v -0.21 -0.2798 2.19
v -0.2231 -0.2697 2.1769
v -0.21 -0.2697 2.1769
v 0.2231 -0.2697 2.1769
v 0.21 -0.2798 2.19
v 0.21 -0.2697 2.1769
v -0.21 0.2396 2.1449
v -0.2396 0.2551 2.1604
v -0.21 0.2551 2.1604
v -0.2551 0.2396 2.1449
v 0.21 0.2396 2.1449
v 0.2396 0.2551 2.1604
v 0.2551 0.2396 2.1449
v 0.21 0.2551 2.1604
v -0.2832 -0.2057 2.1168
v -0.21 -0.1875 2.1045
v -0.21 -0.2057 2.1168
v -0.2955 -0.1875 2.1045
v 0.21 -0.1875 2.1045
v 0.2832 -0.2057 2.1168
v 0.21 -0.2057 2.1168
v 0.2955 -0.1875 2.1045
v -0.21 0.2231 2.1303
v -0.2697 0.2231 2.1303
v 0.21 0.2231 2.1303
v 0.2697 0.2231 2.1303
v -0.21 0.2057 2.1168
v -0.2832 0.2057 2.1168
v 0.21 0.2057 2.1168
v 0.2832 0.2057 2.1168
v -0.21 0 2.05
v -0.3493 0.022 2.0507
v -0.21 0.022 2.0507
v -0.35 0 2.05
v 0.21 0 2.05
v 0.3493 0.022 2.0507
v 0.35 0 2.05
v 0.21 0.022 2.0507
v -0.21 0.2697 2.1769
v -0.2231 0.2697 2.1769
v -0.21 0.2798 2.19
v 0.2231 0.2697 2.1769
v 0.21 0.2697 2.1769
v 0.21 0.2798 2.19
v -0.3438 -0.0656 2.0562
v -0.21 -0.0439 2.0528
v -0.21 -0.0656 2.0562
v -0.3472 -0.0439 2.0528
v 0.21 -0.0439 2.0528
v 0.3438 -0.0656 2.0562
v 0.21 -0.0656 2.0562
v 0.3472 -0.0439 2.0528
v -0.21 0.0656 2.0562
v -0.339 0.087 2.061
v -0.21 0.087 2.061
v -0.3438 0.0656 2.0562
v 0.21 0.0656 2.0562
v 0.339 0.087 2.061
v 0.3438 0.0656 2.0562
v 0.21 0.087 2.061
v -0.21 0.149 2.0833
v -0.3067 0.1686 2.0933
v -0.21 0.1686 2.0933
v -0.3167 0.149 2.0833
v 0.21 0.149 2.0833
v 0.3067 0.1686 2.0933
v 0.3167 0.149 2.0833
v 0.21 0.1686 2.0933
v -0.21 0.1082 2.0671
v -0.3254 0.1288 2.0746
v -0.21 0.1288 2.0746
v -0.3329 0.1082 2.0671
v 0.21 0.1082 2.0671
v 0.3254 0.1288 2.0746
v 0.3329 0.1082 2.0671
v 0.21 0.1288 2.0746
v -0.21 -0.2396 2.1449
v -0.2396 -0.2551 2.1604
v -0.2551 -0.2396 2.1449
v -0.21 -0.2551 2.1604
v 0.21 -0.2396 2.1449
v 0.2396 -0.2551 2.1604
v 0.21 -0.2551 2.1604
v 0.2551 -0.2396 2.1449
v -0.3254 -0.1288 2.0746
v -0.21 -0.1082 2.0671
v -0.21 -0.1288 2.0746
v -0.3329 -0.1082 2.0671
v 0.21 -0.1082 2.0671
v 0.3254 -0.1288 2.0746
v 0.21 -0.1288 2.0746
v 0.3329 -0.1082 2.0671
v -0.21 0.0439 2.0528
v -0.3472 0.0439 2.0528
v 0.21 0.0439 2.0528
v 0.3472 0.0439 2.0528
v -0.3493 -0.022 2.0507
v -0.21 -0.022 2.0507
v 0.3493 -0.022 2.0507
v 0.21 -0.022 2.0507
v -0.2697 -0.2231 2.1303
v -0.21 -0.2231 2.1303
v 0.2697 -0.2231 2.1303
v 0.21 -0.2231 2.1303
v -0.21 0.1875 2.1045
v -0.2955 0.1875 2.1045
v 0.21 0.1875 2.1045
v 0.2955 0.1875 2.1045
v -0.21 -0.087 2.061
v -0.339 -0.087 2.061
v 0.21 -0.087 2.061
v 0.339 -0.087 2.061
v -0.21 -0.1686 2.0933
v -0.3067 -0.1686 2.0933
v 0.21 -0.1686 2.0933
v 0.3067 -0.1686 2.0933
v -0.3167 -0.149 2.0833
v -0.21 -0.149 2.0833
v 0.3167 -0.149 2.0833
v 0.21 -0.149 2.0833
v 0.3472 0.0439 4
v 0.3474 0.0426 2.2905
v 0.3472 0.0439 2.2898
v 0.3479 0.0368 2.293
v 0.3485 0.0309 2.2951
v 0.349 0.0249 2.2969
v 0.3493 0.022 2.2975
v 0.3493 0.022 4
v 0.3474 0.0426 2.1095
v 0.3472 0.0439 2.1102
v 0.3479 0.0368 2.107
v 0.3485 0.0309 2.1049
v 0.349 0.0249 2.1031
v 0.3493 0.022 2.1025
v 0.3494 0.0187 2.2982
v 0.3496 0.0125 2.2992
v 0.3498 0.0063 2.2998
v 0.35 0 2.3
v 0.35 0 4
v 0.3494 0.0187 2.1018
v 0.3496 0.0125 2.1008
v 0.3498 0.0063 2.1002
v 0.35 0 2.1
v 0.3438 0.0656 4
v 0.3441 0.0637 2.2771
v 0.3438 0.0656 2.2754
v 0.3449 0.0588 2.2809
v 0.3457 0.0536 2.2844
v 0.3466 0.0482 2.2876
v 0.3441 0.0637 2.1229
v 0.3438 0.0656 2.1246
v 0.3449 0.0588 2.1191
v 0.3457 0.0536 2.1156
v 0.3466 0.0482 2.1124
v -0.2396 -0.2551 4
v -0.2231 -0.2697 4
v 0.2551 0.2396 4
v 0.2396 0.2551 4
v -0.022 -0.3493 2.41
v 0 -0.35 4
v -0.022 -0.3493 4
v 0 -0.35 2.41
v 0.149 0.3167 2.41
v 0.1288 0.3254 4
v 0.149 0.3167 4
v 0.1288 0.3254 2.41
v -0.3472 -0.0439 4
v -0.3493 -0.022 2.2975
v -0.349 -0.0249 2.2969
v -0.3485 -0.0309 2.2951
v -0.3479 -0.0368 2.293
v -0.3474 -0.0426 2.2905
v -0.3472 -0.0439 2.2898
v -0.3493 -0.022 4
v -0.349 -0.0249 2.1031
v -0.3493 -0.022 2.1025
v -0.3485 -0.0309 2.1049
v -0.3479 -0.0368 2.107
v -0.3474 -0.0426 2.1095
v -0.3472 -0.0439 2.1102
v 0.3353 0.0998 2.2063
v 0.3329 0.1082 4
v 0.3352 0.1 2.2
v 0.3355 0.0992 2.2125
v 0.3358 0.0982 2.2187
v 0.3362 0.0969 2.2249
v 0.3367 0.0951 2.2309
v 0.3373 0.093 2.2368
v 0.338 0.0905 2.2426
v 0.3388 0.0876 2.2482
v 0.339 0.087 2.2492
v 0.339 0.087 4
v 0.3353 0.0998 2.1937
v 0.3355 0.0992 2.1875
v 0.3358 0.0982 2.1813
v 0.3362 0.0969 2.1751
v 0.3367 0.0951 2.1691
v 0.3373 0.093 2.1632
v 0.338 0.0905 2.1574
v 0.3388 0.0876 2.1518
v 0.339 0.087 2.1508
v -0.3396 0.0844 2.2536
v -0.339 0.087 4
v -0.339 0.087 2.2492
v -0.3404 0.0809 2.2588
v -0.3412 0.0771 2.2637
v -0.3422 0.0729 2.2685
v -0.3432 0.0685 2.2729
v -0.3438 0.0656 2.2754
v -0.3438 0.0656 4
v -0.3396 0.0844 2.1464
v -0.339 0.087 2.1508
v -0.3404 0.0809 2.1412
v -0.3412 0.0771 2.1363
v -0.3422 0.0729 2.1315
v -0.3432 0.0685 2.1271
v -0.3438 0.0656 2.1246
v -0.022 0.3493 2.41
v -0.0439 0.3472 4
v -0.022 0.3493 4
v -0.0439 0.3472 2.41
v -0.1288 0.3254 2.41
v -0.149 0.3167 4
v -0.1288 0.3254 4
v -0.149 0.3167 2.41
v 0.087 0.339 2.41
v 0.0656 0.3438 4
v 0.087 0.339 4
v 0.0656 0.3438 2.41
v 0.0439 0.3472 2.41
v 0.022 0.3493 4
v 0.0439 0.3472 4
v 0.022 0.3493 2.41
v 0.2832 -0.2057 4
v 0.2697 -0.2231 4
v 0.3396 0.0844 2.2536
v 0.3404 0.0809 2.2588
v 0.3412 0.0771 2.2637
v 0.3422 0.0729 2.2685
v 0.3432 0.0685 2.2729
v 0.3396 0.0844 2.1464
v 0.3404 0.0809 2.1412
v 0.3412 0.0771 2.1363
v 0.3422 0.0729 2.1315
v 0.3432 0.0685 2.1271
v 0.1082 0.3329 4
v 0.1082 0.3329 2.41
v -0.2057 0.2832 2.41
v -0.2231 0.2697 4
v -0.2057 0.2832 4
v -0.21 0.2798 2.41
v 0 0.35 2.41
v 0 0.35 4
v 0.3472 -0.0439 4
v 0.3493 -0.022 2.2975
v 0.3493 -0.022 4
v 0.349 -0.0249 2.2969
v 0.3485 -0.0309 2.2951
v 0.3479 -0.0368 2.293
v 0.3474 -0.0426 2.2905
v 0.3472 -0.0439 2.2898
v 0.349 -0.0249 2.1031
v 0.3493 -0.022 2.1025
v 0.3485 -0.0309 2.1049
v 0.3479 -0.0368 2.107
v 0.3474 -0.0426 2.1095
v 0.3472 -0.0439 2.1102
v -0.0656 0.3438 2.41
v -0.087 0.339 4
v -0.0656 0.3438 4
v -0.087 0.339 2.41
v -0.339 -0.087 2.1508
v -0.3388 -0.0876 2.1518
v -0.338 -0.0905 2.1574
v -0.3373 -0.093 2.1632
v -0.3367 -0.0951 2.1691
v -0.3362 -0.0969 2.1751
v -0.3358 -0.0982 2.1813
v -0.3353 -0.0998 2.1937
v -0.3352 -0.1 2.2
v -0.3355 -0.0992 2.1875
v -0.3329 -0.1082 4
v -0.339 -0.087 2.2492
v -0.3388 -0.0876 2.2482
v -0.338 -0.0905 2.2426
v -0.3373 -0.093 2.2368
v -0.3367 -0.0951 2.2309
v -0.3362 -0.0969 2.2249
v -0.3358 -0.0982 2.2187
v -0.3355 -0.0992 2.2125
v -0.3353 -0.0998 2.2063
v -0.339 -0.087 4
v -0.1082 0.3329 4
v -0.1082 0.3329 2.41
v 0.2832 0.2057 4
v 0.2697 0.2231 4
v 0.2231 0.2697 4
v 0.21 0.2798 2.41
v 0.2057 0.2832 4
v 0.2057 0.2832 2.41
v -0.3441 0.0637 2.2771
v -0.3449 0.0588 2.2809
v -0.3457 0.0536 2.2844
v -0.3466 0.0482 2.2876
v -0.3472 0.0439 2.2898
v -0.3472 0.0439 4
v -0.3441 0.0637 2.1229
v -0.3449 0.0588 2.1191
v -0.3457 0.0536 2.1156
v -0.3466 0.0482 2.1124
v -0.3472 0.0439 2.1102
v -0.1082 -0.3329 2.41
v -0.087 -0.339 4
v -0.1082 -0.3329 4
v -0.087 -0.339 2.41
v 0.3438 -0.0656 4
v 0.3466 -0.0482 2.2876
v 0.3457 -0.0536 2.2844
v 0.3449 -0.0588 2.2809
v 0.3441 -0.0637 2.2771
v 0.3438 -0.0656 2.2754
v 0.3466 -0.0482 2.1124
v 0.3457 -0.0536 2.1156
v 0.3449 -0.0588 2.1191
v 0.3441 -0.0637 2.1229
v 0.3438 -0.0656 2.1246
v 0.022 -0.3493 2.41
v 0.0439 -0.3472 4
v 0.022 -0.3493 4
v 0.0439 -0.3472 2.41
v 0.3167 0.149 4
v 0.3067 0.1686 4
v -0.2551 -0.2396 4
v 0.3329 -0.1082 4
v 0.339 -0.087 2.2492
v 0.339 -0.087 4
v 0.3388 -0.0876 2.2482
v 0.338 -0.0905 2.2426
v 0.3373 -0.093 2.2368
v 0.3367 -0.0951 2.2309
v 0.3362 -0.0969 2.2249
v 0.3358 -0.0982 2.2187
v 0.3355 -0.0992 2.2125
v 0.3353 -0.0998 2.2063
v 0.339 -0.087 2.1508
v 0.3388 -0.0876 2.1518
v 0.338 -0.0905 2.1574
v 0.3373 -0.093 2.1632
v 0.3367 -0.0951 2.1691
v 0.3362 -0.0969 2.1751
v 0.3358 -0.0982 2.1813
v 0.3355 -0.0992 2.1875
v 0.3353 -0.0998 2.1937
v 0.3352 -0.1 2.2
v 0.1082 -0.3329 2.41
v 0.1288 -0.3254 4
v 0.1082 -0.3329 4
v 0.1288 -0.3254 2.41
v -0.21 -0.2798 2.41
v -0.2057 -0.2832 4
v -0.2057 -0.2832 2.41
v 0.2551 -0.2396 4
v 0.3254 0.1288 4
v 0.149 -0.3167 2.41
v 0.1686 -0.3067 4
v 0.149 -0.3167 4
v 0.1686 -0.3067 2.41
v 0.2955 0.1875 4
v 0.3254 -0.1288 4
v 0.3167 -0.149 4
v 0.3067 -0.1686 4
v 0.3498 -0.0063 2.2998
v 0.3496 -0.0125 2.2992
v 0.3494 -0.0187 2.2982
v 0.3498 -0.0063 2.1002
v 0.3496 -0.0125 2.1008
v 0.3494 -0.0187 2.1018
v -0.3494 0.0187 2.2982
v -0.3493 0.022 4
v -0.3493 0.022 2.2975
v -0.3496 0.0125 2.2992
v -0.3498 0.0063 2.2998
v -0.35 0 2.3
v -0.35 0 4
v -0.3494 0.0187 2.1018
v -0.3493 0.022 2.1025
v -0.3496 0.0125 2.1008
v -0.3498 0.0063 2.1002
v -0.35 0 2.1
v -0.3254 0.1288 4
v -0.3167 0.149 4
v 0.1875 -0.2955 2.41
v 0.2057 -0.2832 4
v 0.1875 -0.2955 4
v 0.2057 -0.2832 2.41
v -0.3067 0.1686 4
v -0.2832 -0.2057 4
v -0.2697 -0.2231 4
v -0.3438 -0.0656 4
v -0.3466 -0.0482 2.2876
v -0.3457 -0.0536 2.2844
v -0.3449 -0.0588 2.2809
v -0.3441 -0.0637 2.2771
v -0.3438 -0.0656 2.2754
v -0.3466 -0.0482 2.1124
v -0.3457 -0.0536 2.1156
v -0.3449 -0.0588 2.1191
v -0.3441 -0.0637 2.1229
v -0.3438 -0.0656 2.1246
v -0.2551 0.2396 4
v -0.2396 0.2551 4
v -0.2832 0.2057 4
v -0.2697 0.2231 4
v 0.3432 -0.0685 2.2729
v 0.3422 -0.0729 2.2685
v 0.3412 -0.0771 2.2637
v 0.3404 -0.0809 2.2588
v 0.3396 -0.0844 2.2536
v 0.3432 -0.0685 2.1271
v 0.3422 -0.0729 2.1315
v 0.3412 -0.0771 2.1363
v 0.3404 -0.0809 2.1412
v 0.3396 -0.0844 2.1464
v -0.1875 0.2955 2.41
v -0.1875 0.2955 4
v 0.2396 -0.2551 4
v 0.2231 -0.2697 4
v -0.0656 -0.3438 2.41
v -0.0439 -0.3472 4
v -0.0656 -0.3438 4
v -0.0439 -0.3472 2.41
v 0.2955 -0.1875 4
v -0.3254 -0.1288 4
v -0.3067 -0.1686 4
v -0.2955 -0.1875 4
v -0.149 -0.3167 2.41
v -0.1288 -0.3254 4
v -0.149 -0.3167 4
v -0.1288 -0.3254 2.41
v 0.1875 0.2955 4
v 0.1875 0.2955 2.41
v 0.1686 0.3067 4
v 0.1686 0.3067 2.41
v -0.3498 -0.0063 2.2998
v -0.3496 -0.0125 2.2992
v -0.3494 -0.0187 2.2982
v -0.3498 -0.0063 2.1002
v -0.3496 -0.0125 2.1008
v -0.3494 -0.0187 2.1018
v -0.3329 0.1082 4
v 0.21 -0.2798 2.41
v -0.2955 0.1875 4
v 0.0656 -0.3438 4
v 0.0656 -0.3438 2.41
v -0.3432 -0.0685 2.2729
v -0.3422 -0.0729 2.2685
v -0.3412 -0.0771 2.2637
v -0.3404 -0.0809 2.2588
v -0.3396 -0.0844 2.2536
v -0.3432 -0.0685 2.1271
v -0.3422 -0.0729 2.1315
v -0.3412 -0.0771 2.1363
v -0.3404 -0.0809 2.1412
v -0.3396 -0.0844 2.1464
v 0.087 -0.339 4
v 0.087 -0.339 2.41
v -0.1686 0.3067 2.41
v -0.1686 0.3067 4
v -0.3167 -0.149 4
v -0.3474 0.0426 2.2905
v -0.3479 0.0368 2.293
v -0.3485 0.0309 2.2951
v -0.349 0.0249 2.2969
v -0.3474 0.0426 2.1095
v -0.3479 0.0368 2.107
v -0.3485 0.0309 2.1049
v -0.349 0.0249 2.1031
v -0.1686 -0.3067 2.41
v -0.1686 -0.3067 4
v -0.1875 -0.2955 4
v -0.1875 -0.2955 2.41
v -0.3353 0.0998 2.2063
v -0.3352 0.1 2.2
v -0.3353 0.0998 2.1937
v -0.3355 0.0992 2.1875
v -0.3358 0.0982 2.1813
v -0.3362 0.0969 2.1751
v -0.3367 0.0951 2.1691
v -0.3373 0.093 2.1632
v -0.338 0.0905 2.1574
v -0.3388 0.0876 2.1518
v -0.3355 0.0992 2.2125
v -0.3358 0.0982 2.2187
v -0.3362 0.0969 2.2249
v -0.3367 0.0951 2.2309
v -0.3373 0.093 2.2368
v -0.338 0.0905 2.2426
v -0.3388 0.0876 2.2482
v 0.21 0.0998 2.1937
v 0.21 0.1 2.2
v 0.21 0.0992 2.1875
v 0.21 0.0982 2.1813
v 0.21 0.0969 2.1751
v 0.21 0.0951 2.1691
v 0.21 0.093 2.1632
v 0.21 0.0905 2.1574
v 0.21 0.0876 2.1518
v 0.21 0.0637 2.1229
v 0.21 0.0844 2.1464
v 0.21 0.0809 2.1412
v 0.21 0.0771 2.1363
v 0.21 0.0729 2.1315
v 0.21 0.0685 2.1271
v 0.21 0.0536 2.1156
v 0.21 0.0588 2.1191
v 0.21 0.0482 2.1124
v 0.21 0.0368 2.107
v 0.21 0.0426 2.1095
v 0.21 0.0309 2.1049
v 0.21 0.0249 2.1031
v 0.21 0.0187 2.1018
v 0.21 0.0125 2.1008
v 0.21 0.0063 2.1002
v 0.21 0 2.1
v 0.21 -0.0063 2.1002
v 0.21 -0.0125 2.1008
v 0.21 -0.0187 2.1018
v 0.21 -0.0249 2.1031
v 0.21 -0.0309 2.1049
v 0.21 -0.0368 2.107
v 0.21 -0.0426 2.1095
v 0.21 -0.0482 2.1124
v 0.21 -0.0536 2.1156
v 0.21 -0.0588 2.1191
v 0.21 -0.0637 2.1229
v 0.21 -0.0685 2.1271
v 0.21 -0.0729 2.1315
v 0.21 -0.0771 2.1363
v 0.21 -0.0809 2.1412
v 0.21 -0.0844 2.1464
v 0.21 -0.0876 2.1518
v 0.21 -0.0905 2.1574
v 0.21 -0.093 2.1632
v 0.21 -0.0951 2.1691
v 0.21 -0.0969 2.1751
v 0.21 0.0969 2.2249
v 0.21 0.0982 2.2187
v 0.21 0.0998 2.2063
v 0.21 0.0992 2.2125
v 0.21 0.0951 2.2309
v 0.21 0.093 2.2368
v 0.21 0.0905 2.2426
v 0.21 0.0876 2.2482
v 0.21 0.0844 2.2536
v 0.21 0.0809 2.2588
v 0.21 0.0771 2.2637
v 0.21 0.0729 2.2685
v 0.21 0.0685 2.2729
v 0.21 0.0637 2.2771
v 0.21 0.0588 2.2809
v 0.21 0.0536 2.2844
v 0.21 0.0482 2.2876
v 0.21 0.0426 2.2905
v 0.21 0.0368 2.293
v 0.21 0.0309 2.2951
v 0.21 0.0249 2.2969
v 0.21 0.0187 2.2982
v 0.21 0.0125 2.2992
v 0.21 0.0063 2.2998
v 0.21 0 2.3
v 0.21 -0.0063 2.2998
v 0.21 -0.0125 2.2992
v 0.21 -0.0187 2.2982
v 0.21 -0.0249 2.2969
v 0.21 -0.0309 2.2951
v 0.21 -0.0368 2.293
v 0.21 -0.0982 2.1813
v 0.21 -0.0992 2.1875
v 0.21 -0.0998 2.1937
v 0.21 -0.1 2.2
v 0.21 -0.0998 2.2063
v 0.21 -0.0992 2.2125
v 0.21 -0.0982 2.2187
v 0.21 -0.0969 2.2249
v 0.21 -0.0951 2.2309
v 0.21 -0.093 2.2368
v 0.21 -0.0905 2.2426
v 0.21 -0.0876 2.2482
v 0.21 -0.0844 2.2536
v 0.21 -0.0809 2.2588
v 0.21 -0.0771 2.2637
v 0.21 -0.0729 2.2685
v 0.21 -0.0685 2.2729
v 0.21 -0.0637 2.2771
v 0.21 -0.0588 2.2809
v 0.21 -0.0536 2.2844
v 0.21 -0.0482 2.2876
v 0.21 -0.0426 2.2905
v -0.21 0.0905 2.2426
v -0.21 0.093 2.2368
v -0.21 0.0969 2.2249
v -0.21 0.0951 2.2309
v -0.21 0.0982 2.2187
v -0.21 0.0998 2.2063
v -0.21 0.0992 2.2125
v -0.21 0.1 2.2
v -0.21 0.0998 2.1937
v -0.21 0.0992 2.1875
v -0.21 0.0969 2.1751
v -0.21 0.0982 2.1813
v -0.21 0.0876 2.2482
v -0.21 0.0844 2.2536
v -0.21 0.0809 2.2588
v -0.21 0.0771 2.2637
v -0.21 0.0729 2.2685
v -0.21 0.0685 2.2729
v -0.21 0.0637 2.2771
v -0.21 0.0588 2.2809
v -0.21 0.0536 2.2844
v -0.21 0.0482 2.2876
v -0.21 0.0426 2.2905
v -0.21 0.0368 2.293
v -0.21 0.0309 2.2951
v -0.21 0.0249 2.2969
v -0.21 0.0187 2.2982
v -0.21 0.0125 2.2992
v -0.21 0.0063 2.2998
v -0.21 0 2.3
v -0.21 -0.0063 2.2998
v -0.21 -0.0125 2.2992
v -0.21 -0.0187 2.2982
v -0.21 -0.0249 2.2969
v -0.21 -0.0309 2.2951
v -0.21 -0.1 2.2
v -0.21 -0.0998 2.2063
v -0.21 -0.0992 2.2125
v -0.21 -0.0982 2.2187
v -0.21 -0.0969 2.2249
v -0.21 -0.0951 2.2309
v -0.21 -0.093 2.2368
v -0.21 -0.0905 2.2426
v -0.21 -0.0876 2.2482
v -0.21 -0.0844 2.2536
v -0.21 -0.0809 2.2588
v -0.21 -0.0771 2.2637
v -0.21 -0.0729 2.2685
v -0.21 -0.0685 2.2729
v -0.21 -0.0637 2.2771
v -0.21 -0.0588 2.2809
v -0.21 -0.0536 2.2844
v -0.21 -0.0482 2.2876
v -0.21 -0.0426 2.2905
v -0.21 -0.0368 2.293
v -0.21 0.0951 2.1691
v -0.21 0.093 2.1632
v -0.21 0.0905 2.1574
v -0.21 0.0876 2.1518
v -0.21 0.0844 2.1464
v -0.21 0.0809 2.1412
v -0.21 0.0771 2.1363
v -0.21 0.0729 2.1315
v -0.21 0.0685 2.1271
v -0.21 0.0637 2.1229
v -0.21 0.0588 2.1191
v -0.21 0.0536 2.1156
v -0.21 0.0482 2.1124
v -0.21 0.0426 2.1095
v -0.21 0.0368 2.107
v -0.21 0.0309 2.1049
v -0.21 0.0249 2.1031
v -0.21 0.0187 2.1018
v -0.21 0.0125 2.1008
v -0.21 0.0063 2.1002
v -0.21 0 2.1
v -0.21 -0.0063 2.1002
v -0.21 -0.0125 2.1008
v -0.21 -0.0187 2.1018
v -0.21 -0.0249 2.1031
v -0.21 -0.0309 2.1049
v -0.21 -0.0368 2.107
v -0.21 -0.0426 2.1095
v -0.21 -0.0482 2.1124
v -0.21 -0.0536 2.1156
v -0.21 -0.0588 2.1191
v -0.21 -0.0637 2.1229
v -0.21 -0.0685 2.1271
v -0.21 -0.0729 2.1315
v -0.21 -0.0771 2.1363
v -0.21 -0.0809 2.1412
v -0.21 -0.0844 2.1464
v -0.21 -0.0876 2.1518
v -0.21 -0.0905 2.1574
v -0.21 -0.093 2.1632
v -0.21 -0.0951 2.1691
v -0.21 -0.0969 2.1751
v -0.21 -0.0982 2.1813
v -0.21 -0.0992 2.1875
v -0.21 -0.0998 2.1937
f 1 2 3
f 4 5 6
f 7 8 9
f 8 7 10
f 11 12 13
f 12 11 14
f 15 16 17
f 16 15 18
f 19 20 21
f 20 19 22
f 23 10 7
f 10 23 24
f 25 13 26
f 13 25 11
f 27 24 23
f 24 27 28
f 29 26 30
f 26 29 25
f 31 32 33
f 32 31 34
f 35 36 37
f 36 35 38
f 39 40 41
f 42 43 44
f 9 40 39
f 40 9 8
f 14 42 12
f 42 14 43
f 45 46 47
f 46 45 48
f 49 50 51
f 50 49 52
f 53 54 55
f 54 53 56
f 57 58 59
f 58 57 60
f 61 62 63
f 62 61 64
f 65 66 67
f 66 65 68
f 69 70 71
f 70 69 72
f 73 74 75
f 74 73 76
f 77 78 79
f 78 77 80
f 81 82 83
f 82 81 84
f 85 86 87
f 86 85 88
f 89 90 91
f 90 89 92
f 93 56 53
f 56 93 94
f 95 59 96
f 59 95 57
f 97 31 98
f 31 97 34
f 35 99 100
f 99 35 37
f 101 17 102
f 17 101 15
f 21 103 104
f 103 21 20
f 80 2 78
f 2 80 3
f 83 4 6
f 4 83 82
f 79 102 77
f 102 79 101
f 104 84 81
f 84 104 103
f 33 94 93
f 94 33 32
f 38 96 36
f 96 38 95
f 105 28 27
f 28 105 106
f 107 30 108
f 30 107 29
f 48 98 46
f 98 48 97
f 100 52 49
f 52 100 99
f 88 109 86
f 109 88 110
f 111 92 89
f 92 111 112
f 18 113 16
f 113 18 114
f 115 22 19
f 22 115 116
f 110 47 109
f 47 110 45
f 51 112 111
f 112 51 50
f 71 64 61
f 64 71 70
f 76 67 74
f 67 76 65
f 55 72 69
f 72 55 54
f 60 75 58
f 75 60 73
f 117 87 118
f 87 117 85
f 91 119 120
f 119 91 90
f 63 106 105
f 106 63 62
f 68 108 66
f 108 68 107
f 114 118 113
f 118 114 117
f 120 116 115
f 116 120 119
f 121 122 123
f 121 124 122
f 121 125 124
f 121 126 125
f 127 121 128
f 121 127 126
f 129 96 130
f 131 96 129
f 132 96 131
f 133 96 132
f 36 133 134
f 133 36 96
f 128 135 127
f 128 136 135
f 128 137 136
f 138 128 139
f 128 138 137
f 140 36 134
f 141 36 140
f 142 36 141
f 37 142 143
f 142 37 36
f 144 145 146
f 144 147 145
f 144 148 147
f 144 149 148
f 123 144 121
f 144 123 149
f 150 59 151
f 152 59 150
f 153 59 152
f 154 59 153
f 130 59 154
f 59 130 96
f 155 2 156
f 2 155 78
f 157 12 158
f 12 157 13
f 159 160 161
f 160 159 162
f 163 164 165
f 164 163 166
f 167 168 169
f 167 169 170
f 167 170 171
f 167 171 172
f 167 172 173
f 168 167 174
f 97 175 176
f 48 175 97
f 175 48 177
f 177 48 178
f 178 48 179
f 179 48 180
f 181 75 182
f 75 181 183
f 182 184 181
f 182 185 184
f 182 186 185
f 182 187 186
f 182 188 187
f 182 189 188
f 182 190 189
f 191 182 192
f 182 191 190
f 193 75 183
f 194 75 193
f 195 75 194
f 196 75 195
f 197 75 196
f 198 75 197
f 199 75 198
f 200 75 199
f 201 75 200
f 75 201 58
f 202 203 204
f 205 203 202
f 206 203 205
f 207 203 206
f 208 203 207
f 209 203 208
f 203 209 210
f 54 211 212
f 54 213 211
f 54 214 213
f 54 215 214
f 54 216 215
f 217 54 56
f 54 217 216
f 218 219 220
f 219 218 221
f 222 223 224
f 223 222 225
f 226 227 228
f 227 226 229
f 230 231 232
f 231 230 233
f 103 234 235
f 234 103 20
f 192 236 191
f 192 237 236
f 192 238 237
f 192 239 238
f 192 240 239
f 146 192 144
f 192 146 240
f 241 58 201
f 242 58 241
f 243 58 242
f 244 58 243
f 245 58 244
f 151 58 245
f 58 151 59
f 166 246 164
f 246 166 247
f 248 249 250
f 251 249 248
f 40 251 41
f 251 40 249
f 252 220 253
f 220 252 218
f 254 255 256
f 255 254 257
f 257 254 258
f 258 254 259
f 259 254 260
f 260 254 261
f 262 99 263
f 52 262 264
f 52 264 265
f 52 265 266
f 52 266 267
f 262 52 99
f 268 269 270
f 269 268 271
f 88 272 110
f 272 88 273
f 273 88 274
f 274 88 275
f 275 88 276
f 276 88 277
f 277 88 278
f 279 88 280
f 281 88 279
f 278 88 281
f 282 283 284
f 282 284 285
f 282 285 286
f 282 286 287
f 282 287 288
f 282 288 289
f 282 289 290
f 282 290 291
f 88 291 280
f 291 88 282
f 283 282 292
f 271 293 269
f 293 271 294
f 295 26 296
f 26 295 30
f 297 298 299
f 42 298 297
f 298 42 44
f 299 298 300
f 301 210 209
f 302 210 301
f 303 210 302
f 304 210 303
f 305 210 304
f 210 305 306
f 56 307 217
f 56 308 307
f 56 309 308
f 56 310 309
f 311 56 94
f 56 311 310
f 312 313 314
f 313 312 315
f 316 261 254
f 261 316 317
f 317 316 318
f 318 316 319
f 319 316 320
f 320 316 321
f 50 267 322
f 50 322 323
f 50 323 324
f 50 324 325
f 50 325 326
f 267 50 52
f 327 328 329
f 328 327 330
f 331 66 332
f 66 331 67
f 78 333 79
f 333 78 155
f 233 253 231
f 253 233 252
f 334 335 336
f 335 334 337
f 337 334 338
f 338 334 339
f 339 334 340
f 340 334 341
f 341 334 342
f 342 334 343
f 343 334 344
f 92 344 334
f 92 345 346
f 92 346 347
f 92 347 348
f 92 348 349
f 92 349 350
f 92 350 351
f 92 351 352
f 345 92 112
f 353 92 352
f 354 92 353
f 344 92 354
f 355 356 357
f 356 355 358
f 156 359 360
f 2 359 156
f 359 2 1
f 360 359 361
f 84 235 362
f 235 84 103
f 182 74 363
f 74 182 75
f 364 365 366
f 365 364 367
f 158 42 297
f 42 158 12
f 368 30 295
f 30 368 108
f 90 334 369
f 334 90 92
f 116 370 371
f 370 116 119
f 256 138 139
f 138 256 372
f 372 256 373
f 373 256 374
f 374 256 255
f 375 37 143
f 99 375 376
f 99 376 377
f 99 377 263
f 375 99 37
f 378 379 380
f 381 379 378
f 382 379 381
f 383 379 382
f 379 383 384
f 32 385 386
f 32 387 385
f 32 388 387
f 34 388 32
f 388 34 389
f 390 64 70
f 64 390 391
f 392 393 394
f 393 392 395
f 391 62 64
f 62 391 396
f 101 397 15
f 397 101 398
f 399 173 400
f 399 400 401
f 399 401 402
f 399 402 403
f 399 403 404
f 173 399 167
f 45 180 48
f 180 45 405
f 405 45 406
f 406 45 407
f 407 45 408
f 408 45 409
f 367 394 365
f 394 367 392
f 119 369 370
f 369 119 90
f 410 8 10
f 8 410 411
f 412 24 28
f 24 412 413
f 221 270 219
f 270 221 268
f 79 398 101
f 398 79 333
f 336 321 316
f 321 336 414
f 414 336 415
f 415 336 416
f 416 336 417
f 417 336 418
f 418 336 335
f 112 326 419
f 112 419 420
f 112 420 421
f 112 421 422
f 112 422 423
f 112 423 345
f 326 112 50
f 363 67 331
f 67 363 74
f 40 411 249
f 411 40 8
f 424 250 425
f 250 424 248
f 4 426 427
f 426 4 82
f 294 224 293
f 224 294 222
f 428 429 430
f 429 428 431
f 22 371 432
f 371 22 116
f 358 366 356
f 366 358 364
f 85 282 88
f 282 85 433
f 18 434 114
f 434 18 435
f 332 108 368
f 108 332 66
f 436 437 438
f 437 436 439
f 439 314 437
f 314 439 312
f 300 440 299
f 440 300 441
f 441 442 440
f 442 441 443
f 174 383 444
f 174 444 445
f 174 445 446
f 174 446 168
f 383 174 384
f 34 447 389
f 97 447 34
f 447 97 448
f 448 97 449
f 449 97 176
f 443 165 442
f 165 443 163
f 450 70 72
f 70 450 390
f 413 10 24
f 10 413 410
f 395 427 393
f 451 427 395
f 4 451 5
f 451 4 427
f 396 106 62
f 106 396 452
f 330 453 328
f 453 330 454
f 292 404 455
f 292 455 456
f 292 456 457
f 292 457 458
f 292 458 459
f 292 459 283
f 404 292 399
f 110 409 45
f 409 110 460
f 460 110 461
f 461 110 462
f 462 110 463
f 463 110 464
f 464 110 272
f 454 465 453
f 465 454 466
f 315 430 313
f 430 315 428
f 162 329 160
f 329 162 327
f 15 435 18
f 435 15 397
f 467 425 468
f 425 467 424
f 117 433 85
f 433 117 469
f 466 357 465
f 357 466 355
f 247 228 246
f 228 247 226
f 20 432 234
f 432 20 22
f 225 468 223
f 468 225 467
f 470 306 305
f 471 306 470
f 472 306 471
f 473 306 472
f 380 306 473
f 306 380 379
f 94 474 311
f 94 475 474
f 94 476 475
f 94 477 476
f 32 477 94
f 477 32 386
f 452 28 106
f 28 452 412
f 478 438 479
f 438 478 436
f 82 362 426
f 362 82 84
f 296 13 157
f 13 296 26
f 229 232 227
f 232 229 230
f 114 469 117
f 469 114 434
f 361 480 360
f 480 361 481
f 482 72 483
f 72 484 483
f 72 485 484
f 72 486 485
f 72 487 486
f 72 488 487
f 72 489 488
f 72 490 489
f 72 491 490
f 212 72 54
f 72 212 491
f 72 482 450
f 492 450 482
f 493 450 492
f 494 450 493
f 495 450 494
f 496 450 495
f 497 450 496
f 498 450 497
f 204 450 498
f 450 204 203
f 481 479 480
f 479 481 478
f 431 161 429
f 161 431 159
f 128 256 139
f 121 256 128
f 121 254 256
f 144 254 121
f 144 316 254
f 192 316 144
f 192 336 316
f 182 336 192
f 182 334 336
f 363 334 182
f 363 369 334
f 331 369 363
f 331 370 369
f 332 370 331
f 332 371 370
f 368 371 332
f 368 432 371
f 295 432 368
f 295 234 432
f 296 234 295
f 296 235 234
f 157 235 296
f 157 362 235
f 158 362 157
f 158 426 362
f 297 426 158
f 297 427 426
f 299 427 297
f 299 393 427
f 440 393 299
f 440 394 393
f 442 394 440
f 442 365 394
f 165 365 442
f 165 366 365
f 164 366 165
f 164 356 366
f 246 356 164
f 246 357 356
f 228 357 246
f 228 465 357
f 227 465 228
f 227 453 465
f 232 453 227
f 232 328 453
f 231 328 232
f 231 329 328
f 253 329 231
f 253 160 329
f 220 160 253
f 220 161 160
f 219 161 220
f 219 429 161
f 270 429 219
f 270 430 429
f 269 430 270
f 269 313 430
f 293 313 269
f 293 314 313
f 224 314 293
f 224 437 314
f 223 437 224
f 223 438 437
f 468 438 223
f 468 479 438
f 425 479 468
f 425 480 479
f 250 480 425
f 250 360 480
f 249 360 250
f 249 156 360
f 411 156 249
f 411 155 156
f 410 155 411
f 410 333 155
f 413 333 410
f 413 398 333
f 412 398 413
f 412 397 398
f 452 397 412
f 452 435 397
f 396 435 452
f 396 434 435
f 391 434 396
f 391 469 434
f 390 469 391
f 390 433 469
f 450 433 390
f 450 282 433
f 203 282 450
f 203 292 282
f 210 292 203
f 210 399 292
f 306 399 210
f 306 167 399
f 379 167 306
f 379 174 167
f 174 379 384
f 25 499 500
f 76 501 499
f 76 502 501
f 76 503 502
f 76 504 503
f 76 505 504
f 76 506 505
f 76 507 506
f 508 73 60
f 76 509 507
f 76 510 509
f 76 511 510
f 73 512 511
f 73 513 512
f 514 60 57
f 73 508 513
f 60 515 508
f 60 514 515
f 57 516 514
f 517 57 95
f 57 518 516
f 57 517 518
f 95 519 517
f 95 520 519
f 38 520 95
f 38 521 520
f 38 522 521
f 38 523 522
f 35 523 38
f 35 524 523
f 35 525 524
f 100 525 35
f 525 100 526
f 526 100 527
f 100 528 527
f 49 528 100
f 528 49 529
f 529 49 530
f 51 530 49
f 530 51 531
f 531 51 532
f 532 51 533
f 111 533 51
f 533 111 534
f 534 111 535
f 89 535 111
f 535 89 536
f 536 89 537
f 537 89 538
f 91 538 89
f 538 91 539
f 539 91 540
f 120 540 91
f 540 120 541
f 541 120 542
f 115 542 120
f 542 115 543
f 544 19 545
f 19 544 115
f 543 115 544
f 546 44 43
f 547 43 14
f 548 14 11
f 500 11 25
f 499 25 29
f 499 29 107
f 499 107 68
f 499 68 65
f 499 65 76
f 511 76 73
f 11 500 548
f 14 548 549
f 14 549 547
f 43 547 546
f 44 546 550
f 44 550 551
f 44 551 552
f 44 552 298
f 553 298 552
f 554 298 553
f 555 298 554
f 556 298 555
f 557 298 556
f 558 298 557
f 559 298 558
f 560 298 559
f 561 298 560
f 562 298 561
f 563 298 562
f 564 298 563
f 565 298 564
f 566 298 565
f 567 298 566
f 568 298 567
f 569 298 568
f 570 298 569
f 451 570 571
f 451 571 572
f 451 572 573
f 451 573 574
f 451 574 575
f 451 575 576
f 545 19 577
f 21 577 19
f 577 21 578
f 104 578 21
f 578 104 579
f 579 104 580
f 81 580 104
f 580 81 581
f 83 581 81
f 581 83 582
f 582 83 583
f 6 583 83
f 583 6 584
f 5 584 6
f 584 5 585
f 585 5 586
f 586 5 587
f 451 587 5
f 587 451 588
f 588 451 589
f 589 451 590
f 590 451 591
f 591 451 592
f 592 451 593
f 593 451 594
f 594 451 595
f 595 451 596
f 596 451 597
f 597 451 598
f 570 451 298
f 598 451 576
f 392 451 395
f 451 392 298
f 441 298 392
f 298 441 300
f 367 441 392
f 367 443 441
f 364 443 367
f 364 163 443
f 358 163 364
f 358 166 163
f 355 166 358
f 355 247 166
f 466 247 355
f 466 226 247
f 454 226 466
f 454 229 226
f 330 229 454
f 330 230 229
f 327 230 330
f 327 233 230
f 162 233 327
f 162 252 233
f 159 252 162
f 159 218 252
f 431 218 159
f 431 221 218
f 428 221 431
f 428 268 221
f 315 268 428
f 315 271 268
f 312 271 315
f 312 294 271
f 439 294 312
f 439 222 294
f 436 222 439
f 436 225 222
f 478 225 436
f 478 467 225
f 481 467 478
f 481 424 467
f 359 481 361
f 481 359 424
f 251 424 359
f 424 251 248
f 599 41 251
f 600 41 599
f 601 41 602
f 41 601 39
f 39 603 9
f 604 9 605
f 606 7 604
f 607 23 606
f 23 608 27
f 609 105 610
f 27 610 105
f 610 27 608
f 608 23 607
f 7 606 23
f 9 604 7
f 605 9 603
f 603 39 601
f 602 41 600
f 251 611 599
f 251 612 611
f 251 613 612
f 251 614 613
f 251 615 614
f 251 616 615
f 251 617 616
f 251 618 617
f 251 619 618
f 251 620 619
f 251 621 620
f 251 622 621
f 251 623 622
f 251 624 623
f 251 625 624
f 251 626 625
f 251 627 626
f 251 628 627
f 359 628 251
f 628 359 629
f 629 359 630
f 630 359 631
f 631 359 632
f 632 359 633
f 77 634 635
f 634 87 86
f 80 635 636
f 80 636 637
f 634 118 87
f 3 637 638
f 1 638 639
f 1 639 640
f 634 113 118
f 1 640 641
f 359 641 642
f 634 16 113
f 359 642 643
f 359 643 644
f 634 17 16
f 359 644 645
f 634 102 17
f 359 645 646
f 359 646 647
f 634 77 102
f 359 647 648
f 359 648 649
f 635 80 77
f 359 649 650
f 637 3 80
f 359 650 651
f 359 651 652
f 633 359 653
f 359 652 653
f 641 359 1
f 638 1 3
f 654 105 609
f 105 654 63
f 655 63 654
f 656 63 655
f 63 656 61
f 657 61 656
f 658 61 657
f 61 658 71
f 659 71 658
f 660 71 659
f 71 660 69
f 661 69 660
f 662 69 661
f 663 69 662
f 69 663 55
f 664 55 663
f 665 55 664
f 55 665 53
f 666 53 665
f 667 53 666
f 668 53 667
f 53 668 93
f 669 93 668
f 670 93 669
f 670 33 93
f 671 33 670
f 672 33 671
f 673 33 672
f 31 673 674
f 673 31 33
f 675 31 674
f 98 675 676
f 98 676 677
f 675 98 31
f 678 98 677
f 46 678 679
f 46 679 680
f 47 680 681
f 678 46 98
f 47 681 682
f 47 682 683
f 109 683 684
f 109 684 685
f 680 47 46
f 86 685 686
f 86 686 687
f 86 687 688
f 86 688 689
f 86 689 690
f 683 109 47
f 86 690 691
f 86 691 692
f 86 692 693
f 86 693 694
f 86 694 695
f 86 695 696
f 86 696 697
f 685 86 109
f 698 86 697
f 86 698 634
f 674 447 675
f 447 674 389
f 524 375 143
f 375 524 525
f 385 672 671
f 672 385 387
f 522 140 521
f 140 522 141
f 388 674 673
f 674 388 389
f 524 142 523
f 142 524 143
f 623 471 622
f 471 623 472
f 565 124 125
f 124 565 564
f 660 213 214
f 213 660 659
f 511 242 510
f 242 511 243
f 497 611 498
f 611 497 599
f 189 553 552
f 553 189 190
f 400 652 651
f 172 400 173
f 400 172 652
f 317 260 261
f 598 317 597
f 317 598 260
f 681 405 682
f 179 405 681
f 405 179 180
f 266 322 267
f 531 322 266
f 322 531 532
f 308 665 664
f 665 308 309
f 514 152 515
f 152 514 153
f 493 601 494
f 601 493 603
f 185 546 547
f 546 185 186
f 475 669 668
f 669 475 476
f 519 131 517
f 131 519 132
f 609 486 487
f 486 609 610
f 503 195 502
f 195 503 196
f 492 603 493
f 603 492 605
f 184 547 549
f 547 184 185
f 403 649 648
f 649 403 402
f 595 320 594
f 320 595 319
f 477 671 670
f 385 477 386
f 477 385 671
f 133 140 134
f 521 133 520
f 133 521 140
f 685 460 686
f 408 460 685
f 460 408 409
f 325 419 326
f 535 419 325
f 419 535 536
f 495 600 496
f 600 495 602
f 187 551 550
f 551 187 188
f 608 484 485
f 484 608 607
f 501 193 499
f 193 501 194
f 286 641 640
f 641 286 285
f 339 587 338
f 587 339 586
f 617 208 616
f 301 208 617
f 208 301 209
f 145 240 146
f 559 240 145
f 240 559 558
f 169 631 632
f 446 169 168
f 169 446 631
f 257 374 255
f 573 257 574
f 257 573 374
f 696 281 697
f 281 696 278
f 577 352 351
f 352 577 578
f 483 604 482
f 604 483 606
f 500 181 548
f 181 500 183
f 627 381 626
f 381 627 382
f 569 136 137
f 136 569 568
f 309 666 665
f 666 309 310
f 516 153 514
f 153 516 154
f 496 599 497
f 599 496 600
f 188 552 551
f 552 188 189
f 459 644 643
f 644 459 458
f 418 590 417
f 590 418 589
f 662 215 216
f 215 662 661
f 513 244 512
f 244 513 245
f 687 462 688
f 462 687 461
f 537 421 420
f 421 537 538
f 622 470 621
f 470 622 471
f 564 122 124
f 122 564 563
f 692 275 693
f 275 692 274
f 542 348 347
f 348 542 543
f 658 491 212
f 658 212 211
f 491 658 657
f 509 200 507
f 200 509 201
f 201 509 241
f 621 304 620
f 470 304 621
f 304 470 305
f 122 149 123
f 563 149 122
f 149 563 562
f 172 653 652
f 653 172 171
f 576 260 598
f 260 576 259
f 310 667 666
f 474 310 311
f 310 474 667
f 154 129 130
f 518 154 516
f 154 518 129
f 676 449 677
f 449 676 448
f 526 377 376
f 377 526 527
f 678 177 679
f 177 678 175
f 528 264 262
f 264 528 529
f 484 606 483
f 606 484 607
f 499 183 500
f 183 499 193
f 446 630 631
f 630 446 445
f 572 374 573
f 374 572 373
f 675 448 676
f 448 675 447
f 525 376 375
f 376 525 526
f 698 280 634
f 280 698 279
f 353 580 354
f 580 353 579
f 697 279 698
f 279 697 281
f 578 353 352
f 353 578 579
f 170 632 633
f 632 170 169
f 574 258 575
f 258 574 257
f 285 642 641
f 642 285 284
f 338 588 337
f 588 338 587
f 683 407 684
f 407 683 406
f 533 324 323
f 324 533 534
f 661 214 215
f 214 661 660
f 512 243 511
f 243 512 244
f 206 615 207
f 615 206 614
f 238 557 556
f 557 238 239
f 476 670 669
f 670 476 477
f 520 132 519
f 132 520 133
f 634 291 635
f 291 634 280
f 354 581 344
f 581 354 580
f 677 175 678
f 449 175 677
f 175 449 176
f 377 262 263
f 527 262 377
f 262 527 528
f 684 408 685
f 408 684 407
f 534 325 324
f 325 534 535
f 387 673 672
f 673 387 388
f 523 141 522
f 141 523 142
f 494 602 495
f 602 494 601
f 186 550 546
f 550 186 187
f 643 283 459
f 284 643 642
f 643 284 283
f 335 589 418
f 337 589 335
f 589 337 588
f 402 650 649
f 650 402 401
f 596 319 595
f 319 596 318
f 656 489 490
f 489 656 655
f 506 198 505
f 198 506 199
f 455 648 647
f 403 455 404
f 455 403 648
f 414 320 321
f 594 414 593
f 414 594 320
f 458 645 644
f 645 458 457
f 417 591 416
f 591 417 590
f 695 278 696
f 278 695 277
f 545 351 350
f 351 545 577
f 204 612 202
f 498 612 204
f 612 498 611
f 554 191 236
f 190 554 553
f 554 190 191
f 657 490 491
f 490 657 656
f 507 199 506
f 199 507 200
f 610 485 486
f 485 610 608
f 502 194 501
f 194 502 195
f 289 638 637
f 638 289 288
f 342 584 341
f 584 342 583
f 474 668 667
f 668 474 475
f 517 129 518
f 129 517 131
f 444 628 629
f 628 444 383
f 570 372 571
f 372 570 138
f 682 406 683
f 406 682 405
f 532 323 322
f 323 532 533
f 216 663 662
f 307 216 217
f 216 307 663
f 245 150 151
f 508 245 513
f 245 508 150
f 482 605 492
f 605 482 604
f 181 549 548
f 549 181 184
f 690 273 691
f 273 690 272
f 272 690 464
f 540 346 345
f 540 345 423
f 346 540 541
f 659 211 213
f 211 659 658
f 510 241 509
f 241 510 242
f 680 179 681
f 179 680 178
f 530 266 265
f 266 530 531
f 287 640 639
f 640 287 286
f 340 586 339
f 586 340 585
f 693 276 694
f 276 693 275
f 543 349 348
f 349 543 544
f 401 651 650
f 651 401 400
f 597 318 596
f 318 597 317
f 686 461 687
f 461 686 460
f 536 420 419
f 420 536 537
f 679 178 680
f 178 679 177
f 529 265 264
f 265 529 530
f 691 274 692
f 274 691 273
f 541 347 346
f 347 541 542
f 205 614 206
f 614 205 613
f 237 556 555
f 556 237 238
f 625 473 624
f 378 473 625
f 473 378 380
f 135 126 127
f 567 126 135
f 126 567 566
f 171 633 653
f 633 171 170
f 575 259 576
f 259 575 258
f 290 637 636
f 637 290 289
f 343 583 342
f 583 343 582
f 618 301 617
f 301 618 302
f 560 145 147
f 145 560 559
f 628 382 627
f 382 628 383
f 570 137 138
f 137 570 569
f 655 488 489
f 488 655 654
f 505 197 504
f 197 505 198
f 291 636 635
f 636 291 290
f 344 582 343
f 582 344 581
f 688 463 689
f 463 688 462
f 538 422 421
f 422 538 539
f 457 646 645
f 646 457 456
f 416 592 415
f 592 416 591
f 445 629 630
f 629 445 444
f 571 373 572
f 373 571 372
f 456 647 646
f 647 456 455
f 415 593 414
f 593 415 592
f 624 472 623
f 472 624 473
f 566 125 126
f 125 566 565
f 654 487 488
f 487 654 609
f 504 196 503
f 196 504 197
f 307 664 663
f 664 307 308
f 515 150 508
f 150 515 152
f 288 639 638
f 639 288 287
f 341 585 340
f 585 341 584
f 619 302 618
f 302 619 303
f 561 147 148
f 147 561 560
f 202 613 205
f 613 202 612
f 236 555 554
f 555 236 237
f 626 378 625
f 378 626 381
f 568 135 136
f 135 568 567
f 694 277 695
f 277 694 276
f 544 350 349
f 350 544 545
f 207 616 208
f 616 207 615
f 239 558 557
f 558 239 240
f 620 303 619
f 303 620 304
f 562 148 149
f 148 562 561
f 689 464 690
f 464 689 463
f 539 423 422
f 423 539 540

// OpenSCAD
// distal_arm.scad Distal arm of the robot
size_per = 1/100;
distal_arm();

module arm_radius_cutter($fn=100){
    cube_size = 100*size_per;
    
    difference(){
        translate([-cube_size/2, -cube_size/2, 0]) cube(cube_size);
        rotate([0,90,0]) cylinder(h=cube_size*1.1, r=35*size_per,center=true);
    }
}

module distal_arm(length=200, width=35, base_rad=50, end_rad=50*size_per,start_x =0,start_y=0, start_z=200, $fn=100) {
    length = length*size_per;
    width = width*size_per;
    base_rad = base_rad*size_per;
    end_rad = end_rad*size_per;
    cut_width = 42*size_per;
    start_coord = [start_x*size_per, start_y*size_per, start_z*size_per];
    
    difference(){
        translate(start_coord) cylinder(h=length, r=width);
        translate([-cut_width/2, -length/4, (start_z-1)*size_per]) cube([cut_width, length, cut_width]);
        //translate([-length-(20*size_per), -length/4, (start_z*5)*size_per]) cube(length);
        translate([-length/2,0,(20*size_per)+length]) rotate([0,90,0]) cylinder(h=length,r=10*size_per);
        rotate([0,180,0]) translate([0,0,-240*size_per]) arm_radius_cutter();
        }
    }
